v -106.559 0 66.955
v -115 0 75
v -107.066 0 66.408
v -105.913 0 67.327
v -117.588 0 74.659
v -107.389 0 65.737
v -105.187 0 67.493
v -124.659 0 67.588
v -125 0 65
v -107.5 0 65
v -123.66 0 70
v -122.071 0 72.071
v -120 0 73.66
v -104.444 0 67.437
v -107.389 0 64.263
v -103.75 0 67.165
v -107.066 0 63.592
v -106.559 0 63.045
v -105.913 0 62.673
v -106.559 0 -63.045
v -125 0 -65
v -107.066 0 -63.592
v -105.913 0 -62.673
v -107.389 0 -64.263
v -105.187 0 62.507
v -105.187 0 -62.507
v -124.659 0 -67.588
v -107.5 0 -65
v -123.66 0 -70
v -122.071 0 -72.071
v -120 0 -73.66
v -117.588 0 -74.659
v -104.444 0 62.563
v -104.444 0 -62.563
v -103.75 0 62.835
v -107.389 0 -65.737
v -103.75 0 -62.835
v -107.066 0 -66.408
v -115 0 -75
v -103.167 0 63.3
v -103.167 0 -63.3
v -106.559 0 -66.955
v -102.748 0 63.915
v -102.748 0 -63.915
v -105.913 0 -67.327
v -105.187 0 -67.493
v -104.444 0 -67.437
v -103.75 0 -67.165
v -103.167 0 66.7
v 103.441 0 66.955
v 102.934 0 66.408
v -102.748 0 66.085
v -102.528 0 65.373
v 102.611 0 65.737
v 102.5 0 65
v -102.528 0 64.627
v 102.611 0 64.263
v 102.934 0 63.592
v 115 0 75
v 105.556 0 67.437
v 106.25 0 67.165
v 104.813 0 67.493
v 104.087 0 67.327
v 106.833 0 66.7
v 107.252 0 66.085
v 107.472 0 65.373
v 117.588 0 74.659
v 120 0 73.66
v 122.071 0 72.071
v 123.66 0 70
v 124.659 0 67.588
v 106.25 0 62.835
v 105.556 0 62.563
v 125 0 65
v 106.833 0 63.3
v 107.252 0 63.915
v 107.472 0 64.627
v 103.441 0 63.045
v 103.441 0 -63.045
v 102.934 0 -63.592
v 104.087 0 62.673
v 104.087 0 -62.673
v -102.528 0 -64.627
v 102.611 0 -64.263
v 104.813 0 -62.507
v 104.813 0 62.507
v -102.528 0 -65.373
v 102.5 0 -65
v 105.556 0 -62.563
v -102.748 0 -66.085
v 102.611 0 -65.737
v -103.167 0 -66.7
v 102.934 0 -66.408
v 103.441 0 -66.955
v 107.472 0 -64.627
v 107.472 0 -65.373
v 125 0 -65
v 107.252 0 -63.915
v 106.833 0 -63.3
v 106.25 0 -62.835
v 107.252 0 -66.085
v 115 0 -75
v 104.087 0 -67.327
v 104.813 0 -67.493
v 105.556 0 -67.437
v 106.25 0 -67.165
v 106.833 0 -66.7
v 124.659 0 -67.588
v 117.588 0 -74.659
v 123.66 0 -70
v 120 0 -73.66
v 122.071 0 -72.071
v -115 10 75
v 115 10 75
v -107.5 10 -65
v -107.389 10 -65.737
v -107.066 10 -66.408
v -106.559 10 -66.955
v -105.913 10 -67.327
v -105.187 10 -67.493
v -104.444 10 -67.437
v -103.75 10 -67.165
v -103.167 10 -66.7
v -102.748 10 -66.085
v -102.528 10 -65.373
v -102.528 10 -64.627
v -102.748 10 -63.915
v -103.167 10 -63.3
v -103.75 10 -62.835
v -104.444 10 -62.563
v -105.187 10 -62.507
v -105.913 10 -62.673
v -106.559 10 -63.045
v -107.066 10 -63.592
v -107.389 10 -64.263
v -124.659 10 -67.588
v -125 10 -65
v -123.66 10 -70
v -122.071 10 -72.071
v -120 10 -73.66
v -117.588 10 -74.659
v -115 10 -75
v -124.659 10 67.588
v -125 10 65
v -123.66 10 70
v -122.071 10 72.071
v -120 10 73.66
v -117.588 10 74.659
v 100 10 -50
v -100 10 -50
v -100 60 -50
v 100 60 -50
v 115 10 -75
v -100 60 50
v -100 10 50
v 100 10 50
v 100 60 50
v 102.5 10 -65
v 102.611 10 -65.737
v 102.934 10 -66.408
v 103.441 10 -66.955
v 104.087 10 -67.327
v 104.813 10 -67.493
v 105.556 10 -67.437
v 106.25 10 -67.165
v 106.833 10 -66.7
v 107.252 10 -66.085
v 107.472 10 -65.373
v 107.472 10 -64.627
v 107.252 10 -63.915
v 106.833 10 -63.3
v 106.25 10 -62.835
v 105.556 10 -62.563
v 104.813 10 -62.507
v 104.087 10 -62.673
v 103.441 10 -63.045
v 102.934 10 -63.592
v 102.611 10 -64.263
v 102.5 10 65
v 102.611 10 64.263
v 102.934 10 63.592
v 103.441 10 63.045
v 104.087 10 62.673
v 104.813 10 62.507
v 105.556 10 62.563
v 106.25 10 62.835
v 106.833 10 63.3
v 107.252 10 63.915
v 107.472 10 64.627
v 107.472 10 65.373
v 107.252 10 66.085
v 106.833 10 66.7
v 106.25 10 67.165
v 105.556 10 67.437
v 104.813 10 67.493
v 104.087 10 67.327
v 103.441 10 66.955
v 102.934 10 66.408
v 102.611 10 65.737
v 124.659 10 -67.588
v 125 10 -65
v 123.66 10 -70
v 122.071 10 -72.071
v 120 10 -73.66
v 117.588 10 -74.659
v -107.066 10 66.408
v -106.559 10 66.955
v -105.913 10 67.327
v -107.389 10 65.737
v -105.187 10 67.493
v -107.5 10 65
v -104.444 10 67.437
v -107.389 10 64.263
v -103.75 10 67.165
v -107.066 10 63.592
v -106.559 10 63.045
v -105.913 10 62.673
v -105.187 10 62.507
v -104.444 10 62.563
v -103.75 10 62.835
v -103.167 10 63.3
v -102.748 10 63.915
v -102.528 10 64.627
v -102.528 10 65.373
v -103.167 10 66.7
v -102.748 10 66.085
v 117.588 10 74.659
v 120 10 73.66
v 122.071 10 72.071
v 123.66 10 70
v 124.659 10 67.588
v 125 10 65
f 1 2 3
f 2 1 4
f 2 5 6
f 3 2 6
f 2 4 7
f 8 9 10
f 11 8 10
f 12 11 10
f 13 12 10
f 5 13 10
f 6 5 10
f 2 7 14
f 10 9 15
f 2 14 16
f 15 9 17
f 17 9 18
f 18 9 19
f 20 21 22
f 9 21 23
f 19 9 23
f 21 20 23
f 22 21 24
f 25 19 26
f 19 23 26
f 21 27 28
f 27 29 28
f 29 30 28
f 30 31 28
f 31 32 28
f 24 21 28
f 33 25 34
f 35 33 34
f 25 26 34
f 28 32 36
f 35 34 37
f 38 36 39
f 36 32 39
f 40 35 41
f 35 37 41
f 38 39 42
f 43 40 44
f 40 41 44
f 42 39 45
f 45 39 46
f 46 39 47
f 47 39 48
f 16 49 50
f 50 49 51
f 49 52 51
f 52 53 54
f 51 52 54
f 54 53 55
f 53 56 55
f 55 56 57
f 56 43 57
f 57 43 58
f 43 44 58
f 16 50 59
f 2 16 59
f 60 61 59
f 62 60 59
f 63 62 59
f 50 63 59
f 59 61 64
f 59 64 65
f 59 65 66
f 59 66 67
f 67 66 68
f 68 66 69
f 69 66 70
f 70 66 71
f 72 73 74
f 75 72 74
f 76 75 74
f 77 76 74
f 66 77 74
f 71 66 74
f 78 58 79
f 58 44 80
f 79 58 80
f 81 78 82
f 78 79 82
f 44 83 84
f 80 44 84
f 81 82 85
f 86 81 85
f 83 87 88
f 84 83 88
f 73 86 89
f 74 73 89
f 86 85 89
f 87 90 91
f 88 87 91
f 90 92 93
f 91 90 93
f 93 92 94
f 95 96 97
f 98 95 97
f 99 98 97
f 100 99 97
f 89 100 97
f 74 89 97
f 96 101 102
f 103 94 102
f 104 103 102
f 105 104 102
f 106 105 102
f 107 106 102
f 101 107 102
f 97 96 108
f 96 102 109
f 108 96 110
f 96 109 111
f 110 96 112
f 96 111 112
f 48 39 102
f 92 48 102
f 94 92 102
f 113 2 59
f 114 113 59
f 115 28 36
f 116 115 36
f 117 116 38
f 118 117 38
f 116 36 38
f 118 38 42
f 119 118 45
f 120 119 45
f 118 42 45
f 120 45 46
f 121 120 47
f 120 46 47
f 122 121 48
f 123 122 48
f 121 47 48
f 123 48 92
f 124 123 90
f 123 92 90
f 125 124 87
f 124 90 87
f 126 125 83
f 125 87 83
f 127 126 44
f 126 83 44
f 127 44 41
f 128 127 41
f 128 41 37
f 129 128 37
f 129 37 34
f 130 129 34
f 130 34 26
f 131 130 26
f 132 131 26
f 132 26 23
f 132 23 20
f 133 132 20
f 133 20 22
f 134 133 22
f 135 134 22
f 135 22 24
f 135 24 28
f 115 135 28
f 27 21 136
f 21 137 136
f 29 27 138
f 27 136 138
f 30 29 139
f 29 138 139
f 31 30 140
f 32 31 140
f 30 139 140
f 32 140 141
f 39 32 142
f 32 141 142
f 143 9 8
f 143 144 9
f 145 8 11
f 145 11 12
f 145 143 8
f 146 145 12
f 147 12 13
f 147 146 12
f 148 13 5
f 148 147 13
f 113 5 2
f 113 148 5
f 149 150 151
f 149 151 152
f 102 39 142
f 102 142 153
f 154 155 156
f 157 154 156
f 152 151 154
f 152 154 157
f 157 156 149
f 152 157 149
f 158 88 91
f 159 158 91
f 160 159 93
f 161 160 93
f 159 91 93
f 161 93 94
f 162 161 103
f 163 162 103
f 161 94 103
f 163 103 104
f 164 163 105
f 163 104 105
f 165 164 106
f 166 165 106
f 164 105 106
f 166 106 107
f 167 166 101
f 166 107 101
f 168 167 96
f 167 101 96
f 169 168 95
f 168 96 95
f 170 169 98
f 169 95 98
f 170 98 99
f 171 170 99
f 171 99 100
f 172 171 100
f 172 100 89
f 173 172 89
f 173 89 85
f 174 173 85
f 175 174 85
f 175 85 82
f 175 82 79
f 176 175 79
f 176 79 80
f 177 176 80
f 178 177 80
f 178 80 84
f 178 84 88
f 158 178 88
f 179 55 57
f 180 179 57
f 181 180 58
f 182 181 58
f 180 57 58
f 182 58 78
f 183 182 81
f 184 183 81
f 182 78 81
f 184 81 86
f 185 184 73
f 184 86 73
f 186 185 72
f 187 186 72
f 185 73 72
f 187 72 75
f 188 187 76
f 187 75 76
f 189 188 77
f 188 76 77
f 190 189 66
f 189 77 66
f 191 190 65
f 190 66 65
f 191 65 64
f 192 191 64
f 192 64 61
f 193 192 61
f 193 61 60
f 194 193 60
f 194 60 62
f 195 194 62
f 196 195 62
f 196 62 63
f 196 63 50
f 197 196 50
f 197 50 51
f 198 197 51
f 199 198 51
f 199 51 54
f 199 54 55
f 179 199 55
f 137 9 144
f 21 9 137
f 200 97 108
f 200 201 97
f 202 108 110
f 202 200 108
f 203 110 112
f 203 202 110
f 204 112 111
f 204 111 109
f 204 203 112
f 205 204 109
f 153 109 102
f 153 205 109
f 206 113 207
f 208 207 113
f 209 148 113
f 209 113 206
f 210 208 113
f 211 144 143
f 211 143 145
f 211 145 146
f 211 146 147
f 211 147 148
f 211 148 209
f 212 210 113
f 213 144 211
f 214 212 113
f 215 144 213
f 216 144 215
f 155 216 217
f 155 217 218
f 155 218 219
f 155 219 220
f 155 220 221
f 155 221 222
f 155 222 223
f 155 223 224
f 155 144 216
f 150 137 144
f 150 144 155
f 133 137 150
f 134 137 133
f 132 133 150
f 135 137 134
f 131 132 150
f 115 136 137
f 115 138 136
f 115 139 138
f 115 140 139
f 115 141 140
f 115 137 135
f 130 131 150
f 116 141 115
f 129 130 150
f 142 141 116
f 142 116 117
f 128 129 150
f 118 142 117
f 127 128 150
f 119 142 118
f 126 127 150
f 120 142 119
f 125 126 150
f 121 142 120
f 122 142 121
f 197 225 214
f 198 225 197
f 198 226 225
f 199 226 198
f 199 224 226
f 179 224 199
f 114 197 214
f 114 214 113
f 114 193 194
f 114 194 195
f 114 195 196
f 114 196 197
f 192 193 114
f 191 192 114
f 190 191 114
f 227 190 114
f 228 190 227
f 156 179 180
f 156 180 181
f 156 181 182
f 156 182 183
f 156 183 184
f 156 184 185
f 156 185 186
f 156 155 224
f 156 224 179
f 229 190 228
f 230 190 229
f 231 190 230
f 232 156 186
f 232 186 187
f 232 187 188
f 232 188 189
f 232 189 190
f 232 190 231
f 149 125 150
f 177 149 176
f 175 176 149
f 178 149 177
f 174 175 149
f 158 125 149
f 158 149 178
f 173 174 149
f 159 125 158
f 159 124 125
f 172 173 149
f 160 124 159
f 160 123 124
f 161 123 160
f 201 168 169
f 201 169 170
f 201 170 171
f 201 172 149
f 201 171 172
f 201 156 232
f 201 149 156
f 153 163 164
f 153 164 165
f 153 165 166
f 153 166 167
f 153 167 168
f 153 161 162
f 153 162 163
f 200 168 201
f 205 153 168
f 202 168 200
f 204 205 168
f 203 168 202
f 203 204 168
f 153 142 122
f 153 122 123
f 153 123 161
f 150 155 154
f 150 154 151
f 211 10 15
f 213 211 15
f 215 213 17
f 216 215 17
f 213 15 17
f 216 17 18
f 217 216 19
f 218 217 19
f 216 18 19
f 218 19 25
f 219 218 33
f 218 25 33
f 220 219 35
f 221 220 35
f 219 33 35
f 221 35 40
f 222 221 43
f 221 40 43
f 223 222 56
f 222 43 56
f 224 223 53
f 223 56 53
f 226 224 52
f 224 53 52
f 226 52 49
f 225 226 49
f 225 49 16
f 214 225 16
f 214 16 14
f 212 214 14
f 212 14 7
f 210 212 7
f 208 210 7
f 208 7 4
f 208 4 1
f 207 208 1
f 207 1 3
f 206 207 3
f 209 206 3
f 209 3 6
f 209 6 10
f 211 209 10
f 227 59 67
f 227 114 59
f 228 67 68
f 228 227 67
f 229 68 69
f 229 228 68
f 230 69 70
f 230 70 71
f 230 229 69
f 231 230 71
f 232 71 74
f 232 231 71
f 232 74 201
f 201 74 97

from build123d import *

# Parameters (mm, degrees)
SKETCH_1_W             = 250
SKETCH_1_H             = 150
EXTRUDE_1_DEPTH        = 10
FILLET_1_R             = 10
SKETCH_2_W             = 200
SKETCH_2_H             = 100
EXTRUDE_2_DEPTH        = 50
HOLE_WIZARD_M6_1_D     = 5
HOLE_WIZARD_M6_1_DEPTH = 15
HOLE_WIZARD_M6_1_TIP   = 1.502151548


with BuildPart() as part:
    # 草图1 → 凸台-拉伸1 (new body)
    with BuildSketch(Plane(origin=(0, 0, 0), x_dir=(1, 0, 0), z_dir=(0, 1, 0))):
        Rectangle(SKETCH_1_W, SKETCH_1_H)
    extrude(amount=EXTRUDE_1_DEPTH)

    # 圆角1
    fillet_1_edges = [part.edges().sort_by_distance(p)[0] for p in [
        (125, 5, 75),
        (-125, 5, 75),
        (-125, 5, -75),
        (125, 5, -75),
    ]]
    fillet(fillet_1_edges, radius=FILLET_1_R)

    # 草图2 → 凸台-拉伸2 (add)
    with BuildSketch(Plane(origin=(0, 10, 0), x_dir=(1, 0, 0), z_dir=(0, 1, 0))):
        Rectangle(SKETCH_2_W, SKETCH_2_H)
    extrude(amount=EXTRUDE_2_DEPTH)

    # M6 螺纹孔1
    with Locations(Plane(origin=(0, 10, 0), x_dir=(1, 0, 0), z_dir=(0, 1, 0))):
        with Locations((-105, -65), (105, 65), (-105, 65), (105, -65)):
            Hole(HOLE_WIZARD_M6_1_D / 2, depth=HOLE_WIZARD_M6_1_DEPTH)
            with Locations((0, 0, -(HOLE_WIZARD_M6_1_DEPTH + HOLE_WIZARD_M6_1_TIP / 2))):  # 118° drill point
                Cone(0, HOLE_WIZARD_M6_1_D / 2, HOLE_WIZARD_M6_1_TIP, mode=Mode.SUBTRACT)


solid = part.part
